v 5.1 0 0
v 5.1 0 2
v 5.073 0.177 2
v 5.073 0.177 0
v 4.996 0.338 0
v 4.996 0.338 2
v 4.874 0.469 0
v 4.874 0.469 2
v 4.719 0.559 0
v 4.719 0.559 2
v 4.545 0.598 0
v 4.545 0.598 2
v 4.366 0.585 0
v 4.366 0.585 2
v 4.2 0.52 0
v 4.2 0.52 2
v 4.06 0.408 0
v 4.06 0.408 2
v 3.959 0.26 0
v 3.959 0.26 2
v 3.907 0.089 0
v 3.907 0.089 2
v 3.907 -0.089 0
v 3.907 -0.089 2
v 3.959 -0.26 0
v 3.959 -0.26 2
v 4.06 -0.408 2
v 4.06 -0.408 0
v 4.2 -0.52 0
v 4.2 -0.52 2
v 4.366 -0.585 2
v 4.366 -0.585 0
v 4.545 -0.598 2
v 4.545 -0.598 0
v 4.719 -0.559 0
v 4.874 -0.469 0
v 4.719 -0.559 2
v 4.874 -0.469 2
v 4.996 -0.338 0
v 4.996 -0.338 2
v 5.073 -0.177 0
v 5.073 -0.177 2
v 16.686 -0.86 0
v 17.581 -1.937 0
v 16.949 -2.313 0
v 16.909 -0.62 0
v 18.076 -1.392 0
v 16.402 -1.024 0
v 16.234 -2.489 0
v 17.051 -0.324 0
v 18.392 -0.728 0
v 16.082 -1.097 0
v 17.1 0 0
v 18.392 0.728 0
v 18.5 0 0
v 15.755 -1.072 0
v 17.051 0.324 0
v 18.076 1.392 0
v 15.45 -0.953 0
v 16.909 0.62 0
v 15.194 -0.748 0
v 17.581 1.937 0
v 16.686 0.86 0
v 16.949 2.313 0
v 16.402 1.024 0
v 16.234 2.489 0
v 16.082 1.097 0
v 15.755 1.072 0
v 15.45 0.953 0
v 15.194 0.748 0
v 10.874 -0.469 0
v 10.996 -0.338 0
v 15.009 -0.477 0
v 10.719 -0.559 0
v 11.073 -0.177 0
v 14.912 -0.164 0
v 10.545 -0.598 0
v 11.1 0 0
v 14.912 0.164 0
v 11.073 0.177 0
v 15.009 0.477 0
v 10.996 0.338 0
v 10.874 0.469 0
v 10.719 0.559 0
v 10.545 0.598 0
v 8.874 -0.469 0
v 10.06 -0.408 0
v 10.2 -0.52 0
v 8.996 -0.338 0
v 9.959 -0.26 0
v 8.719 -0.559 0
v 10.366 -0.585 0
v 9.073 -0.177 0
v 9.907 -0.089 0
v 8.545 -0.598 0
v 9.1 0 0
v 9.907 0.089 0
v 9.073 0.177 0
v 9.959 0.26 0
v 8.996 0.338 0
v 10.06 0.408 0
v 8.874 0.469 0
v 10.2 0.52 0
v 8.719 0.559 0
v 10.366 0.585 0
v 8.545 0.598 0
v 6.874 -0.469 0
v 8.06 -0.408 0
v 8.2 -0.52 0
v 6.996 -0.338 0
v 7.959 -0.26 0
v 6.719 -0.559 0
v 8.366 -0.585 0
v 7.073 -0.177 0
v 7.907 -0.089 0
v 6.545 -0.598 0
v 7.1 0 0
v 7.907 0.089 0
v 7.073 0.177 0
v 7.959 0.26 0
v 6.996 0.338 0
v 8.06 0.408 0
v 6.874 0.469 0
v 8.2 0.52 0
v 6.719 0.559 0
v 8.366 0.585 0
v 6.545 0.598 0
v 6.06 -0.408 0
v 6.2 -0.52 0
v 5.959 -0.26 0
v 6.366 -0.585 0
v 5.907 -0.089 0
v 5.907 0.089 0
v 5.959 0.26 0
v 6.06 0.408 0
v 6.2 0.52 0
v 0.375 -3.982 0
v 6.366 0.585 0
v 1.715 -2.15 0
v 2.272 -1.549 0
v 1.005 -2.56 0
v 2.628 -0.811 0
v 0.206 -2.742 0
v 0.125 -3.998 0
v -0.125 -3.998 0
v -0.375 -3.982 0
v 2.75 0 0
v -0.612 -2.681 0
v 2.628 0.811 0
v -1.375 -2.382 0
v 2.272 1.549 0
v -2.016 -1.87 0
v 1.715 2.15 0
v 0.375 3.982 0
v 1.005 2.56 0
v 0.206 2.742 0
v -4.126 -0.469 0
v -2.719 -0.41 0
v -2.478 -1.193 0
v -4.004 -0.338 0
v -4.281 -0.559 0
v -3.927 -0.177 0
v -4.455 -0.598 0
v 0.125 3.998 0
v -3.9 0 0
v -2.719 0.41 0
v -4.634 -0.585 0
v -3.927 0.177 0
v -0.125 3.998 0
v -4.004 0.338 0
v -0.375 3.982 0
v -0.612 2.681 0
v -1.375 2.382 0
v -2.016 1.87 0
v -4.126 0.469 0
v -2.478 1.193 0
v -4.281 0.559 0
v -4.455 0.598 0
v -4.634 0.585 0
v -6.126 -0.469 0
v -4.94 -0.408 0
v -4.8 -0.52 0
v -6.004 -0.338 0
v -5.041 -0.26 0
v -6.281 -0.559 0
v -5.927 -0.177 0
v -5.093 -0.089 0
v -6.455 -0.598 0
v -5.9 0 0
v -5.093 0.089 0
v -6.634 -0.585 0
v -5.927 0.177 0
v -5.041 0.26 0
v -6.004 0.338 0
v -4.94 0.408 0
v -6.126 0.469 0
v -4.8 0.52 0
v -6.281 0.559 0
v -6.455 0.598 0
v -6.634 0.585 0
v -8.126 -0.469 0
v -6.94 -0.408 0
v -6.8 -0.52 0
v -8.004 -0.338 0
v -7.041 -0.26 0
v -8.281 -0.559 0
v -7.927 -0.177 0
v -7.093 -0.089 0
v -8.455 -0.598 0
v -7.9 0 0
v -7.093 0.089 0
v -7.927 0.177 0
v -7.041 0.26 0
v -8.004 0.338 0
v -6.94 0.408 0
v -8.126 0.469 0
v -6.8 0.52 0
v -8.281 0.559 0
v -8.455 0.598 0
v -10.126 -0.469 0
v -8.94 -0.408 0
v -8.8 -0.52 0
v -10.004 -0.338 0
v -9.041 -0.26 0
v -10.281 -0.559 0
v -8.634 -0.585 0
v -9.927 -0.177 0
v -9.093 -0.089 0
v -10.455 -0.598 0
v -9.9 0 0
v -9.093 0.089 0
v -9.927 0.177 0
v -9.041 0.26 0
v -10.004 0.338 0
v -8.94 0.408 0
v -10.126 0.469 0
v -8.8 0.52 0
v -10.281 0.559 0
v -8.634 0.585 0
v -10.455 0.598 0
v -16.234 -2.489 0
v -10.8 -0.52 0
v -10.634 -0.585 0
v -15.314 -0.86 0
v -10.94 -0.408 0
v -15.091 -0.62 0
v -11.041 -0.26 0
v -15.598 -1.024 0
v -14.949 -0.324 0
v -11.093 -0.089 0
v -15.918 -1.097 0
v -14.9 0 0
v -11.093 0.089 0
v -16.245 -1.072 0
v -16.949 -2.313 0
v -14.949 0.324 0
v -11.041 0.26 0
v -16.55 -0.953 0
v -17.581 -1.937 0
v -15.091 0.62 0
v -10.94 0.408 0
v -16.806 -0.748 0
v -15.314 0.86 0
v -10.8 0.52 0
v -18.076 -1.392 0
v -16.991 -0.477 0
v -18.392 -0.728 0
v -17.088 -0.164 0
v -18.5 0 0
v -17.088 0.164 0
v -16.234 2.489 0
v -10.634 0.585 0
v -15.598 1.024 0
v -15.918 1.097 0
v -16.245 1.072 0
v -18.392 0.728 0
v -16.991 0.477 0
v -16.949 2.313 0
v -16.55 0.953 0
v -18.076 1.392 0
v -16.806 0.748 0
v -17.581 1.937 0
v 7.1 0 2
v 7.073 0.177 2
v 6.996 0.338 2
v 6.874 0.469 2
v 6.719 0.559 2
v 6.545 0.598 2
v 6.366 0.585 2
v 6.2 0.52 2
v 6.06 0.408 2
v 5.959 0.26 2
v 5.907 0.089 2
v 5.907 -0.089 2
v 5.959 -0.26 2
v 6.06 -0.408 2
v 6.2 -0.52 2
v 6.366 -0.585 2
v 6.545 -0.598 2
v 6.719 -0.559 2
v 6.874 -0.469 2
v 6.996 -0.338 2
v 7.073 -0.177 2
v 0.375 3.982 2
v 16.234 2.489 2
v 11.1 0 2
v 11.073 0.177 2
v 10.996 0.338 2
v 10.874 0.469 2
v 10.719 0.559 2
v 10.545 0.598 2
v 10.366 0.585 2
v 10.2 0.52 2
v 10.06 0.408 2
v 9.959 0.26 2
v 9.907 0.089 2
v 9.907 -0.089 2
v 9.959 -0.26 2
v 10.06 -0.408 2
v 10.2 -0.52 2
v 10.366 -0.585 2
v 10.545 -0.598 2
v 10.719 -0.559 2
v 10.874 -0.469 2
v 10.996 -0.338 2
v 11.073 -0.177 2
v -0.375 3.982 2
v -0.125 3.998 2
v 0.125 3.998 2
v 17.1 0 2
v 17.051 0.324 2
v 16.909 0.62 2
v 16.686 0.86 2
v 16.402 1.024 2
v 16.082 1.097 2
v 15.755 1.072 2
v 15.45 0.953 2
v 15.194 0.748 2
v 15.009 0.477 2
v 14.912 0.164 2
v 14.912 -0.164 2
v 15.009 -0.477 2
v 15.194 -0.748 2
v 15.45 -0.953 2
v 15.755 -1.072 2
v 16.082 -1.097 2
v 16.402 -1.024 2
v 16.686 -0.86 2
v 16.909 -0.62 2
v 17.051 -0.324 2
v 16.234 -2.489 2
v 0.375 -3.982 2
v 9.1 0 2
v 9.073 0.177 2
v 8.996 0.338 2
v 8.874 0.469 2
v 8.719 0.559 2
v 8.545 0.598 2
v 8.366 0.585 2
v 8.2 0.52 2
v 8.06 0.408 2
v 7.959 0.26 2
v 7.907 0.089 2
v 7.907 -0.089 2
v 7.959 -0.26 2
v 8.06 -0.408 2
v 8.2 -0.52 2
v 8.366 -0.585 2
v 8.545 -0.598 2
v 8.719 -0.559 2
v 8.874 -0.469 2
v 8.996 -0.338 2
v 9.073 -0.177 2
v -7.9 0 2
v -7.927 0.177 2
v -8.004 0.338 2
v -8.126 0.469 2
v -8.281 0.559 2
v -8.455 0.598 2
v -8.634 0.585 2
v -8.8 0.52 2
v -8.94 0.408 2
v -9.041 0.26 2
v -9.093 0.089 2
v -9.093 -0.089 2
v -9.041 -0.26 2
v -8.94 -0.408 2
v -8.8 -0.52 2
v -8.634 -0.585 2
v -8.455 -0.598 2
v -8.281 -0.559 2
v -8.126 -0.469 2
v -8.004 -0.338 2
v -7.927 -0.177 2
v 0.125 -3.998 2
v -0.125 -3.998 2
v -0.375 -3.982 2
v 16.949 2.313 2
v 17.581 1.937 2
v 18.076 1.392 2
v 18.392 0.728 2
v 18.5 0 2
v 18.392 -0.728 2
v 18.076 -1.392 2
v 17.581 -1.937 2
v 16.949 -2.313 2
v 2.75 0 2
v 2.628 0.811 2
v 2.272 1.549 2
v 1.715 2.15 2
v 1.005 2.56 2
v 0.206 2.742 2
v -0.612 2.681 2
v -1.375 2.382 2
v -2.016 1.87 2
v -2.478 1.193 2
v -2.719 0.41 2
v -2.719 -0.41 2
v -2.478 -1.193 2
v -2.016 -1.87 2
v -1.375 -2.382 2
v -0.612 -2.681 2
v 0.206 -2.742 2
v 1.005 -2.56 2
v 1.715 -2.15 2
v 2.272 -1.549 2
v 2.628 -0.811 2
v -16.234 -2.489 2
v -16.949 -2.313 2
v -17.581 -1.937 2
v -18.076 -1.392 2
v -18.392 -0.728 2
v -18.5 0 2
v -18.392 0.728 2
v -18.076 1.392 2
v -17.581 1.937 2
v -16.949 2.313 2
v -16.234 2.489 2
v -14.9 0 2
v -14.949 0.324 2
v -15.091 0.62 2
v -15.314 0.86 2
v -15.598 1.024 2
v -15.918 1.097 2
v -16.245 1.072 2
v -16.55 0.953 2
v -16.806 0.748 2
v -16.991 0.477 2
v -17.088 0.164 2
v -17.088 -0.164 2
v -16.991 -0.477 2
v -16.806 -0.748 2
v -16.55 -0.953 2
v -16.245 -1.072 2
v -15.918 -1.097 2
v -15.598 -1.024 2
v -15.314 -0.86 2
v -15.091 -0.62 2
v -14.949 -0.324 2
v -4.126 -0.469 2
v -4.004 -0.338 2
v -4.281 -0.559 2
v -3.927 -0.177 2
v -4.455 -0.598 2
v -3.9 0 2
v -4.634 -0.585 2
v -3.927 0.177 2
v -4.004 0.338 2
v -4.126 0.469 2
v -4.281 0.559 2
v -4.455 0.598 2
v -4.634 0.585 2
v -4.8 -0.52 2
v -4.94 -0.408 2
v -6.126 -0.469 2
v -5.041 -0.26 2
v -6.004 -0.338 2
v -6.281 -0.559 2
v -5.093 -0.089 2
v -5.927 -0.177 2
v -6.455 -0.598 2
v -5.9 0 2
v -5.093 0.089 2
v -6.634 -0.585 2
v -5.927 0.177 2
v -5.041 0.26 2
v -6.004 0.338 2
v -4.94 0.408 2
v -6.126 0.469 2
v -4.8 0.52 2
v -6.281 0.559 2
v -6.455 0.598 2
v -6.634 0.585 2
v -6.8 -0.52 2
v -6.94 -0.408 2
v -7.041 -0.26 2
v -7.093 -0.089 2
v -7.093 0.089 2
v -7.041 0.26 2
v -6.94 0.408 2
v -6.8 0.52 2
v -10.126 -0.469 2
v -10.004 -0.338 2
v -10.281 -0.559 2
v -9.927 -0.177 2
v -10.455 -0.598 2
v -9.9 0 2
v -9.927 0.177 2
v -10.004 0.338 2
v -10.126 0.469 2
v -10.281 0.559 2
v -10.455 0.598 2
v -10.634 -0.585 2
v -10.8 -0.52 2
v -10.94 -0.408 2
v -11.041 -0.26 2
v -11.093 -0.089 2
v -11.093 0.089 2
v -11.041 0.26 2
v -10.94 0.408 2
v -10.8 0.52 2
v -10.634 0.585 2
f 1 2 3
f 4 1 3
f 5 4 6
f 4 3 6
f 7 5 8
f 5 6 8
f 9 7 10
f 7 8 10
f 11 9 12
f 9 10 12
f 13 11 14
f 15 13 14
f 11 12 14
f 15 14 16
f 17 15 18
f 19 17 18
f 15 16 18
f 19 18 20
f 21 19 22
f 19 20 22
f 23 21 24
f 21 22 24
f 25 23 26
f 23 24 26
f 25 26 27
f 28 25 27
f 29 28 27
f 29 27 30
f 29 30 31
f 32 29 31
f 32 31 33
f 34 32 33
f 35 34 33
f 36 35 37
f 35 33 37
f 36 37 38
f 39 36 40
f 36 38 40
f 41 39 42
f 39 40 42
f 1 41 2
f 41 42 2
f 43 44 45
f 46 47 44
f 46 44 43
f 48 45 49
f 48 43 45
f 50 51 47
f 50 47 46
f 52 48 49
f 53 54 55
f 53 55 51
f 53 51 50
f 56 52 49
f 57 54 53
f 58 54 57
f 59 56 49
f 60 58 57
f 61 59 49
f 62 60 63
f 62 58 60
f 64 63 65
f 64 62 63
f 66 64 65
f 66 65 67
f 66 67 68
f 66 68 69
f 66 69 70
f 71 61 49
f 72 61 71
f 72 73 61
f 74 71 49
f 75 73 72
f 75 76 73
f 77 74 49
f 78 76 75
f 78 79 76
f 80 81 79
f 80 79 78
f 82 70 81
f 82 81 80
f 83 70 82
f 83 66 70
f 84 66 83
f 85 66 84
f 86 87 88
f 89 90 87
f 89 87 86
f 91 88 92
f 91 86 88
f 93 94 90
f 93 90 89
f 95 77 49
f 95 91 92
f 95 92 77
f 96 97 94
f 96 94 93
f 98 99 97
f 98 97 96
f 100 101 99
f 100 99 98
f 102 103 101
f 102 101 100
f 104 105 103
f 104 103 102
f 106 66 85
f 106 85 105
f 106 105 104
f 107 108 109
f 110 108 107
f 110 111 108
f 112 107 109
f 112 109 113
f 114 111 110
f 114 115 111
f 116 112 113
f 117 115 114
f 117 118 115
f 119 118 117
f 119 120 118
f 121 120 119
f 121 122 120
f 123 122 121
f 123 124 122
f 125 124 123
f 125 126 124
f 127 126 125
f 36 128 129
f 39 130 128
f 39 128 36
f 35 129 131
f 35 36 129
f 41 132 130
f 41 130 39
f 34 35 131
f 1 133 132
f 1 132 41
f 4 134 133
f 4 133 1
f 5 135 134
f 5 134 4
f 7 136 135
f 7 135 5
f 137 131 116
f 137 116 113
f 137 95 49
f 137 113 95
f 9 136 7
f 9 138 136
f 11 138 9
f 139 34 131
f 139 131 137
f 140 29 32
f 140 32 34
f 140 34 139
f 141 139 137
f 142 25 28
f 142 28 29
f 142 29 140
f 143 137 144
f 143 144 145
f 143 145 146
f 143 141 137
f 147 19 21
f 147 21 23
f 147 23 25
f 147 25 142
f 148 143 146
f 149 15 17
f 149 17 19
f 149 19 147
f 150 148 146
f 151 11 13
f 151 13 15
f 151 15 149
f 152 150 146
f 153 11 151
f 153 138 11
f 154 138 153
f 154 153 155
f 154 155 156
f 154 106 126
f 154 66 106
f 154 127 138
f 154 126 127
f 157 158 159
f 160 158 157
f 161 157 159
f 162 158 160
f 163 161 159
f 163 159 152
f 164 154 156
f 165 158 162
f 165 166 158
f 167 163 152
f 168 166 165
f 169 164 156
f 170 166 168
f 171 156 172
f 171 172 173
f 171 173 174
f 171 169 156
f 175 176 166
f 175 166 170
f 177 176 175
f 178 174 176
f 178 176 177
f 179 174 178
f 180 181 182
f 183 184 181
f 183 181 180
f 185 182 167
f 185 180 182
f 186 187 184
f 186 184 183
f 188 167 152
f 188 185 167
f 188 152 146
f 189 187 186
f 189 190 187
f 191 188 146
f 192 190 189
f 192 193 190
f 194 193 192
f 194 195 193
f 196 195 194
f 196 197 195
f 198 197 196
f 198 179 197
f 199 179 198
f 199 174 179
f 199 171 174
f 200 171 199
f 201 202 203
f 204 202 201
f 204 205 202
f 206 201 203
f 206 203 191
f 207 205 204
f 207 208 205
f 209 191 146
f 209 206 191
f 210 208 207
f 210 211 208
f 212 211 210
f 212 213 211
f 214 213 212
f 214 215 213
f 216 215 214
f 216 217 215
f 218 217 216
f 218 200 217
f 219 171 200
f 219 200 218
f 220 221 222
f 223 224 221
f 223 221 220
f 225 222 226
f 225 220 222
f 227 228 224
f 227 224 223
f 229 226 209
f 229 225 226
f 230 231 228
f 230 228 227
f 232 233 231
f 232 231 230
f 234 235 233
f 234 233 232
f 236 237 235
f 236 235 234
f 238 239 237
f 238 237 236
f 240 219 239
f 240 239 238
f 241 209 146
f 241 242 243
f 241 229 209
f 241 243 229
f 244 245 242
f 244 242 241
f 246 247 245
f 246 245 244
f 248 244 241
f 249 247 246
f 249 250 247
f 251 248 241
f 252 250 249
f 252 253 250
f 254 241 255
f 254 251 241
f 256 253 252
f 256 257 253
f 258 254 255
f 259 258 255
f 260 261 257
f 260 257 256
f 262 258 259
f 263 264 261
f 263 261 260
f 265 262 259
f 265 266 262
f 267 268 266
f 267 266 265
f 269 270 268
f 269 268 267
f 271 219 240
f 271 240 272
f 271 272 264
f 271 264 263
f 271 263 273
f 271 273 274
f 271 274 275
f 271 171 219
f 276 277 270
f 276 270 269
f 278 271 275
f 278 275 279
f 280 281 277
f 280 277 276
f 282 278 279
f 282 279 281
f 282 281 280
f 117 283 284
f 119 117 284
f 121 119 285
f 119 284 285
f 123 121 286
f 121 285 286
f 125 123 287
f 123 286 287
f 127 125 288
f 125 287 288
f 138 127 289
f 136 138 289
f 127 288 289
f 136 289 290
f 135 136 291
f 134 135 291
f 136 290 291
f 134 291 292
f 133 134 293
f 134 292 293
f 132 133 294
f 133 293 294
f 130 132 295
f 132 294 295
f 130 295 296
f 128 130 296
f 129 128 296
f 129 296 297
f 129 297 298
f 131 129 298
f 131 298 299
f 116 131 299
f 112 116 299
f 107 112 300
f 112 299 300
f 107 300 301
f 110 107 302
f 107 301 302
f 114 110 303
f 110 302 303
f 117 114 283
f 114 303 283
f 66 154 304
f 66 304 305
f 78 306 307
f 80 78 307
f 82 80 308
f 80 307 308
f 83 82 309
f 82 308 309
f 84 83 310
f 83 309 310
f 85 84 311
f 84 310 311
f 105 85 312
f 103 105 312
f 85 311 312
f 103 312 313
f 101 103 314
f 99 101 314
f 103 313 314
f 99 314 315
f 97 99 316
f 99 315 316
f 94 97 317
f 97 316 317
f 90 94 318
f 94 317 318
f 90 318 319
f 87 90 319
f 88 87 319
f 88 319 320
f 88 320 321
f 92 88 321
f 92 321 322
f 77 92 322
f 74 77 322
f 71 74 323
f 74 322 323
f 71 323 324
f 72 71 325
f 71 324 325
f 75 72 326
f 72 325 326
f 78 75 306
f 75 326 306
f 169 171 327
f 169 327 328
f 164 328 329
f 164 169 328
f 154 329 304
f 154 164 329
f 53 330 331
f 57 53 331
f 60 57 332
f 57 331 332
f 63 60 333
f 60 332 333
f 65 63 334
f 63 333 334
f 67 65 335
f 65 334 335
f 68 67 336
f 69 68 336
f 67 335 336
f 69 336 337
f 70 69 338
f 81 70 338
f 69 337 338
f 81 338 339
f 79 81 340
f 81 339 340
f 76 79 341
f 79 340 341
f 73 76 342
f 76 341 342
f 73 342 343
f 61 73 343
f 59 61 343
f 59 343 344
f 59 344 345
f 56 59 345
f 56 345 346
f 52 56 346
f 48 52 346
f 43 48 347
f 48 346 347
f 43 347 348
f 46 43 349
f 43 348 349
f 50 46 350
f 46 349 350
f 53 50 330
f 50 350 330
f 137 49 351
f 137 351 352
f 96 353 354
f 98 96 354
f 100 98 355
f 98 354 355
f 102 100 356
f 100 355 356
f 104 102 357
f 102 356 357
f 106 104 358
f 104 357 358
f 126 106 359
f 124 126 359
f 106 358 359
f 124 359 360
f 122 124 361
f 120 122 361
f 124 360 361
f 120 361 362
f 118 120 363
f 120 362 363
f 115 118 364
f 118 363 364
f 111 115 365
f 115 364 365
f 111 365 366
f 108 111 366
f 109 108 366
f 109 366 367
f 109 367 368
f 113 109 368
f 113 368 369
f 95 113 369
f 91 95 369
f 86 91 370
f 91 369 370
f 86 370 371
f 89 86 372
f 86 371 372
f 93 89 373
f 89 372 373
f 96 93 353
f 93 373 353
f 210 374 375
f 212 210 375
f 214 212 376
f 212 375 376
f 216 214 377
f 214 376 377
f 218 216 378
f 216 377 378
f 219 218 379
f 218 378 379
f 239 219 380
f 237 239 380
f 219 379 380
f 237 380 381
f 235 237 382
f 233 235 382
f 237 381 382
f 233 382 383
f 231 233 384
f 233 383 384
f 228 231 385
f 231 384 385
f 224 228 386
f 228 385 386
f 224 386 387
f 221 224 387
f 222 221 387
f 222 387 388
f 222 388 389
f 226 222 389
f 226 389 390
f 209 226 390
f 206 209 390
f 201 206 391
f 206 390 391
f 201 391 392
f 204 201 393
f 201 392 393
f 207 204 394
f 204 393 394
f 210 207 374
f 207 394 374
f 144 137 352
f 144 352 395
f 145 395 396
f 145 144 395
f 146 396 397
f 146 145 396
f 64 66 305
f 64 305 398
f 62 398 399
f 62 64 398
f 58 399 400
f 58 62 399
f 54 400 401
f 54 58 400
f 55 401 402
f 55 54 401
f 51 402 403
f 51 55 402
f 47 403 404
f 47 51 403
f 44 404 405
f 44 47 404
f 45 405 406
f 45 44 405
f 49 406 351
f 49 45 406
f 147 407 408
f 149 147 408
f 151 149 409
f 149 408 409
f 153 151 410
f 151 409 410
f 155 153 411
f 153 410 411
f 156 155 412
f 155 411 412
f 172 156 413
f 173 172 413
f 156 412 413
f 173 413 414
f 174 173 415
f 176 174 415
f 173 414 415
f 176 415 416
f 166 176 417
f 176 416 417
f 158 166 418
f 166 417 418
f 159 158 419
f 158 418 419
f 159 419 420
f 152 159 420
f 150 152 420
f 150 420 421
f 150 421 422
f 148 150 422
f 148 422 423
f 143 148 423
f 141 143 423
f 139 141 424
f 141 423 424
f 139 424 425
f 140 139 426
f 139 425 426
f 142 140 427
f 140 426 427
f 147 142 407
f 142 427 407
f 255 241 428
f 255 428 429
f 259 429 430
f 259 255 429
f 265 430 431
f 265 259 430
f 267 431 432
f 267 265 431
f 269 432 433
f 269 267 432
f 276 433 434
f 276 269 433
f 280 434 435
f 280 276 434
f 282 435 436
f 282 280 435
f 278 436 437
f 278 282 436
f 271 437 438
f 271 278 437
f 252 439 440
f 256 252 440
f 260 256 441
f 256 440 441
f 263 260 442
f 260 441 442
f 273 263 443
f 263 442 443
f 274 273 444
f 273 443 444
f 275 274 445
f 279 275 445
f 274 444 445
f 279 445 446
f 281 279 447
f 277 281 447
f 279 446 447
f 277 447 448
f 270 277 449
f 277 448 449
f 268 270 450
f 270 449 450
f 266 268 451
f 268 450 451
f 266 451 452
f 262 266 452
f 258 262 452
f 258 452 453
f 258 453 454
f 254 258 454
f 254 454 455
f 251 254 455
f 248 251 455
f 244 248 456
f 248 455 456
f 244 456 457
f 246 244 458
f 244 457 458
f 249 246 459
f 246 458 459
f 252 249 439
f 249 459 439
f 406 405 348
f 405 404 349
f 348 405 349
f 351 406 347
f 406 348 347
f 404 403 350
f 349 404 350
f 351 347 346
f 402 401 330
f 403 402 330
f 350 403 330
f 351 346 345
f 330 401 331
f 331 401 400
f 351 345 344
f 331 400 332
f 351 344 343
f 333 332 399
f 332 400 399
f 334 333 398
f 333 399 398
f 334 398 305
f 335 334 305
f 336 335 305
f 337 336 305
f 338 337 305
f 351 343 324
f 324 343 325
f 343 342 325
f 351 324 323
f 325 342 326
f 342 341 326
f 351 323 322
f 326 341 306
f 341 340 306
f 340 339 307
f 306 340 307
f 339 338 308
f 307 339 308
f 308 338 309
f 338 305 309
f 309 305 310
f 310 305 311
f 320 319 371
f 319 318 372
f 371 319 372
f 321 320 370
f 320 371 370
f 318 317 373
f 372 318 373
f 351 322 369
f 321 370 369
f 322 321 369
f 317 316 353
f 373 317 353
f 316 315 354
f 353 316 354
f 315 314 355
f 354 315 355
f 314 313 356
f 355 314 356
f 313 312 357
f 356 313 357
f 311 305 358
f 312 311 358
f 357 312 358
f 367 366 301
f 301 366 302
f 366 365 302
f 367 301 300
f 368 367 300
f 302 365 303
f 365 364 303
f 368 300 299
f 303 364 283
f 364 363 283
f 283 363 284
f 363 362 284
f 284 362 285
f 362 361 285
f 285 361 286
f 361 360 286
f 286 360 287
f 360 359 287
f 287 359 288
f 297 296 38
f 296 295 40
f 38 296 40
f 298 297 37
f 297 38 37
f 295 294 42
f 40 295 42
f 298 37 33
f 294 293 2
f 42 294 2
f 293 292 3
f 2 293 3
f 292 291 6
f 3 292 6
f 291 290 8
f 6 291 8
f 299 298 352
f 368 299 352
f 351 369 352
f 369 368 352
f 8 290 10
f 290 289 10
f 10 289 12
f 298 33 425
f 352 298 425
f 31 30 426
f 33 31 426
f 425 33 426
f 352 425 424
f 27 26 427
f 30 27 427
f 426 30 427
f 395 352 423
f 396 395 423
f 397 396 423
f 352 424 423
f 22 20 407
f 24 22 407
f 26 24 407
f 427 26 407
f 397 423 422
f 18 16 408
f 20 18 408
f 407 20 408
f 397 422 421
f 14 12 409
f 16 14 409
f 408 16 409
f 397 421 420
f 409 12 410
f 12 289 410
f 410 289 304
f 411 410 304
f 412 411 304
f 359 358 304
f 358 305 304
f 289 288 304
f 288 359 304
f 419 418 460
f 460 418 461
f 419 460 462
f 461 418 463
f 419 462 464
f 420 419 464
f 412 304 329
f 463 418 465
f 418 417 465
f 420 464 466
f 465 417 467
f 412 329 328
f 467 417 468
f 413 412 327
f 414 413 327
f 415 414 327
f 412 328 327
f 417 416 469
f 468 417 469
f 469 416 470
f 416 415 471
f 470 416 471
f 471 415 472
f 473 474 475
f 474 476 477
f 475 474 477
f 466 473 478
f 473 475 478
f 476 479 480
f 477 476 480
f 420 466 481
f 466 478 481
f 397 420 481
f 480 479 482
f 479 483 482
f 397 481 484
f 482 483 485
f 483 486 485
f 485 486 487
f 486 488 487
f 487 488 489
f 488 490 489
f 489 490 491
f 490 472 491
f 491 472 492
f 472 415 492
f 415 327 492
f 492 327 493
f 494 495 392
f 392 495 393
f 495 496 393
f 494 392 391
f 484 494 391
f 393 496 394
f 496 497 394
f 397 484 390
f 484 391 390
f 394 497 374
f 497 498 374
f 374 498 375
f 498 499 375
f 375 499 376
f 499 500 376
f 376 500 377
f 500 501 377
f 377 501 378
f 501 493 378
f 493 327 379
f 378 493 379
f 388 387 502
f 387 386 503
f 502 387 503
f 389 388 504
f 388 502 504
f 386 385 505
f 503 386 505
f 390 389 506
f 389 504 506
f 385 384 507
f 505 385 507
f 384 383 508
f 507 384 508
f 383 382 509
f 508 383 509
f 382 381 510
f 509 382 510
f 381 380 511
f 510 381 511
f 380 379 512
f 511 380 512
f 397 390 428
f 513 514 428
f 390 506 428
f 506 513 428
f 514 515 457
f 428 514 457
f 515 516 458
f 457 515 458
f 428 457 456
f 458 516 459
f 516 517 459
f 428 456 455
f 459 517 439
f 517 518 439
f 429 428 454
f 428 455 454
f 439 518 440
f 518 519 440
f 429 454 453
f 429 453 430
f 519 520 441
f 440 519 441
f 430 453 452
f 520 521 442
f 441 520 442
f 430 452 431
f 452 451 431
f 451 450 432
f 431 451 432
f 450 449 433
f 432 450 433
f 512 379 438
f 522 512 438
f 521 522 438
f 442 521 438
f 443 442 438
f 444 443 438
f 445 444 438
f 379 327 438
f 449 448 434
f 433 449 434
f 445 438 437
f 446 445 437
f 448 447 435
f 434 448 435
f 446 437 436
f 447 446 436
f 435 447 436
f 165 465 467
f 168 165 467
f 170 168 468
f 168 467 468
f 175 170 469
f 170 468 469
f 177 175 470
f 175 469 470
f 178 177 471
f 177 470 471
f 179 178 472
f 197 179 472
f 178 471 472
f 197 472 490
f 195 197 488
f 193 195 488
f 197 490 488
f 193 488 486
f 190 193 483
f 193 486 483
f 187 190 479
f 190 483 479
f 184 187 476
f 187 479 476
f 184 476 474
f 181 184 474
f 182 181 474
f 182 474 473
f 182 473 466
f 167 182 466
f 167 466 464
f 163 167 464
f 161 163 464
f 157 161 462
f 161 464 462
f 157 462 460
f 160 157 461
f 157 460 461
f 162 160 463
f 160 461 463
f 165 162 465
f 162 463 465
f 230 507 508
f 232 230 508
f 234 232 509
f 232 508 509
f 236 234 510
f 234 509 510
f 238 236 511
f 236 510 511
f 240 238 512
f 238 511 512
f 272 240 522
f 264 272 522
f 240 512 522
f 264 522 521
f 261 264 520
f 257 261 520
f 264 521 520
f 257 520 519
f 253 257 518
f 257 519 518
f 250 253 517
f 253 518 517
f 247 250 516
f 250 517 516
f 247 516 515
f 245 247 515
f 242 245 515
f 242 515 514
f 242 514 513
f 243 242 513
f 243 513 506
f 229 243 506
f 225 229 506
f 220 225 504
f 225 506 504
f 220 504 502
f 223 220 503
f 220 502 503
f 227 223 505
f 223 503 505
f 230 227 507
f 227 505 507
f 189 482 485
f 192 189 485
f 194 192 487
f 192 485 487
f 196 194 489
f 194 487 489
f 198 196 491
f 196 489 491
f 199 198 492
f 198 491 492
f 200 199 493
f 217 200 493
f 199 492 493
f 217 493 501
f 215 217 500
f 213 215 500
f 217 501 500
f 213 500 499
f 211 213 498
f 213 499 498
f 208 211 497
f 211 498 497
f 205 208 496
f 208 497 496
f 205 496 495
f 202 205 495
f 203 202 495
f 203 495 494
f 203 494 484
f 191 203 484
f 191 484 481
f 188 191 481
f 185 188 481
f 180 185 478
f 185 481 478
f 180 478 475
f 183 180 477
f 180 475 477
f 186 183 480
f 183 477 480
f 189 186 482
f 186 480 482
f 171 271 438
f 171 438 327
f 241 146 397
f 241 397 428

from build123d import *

# Parameters (mm, degrees)
EXTRUDE_1_DEPTH     = 2
SKETCH_2_R          = 2.75
SKETCH_2_R_2        = 1.1
SKETCH_2_R_3        = 0.6
CUT_EXTRUDE_1_DEPTH = 2


with BuildPart() as part:
    # 草图1 → 凸台-拉伸1 (new body)
    with BuildSketch(Plane.XY):
        with BuildLine():
            Line((-16.234375, 2.488989425), (-0.375, 3.982383081))
            ThreePointArc((-0.375, 3.982383081), (0, 4), (0.375, 3.982383081))
            Line((0.375, 3.982383081), (16.234375, 2.488989425))
            ThreePointArc((16.234375, 2.488989425), (18.5, 0), (16.234375, -2.488989425))
            Line((16.234375, -2.488989425), (0.375, -3.982383081))
            ThreePointArc((0.375, -3.982383081), (0, -4), (-0.375, -3.982383081))
            Line((-0.375, -3.982383081), (-16.234375, -2.488989425))
            ThreePointArc((-16.234375, -2.488989425), (-18.5, 0), (-16.234375, 2.488989425))
        make_face()
    extrude(amount=EXTRUDE_1_DEPTH)

    # 草图2 → 切除-拉伸1 (cut)
    with BuildSketch(Plane.XY.offset(2)):
        Circle(SKETCH_2_R)
        with Locations((-16, 0)):
            Circle(SKETCH_2_R_2)
        with Locations((16, 0)):
            Circle(SKETCH_2_R_2)
        with Locations((-4.5, 0)):
            Circle(SKETCH_2_R_3)
        with Locations((-6.5, 0)):
            Circle(SKETCH_2_R_3)
        with Locations((-8.5, 0)):
            Circle(SKETCH_2_R_3)
        with Locations((-10.5, 0)):
            Circle(SKETCH_2_R_3)
        with Locations((4.5, 0)):
            Circle(SKETCH_2_R_3)
        with Locations((10.5, 0)):
            Circle(SKETCH_2_R_3)
        with Locations((8.5, 0)):
            Circle(SKETCH_2_R_3)
        with Locations((6.5, 0)):
            Circle(SKETCH_2_R_3)
    extrude(amount=-CUT_EXTRUDE_1_DEPTH, mode=Mode.SUBTRACT)


solid = part.part
